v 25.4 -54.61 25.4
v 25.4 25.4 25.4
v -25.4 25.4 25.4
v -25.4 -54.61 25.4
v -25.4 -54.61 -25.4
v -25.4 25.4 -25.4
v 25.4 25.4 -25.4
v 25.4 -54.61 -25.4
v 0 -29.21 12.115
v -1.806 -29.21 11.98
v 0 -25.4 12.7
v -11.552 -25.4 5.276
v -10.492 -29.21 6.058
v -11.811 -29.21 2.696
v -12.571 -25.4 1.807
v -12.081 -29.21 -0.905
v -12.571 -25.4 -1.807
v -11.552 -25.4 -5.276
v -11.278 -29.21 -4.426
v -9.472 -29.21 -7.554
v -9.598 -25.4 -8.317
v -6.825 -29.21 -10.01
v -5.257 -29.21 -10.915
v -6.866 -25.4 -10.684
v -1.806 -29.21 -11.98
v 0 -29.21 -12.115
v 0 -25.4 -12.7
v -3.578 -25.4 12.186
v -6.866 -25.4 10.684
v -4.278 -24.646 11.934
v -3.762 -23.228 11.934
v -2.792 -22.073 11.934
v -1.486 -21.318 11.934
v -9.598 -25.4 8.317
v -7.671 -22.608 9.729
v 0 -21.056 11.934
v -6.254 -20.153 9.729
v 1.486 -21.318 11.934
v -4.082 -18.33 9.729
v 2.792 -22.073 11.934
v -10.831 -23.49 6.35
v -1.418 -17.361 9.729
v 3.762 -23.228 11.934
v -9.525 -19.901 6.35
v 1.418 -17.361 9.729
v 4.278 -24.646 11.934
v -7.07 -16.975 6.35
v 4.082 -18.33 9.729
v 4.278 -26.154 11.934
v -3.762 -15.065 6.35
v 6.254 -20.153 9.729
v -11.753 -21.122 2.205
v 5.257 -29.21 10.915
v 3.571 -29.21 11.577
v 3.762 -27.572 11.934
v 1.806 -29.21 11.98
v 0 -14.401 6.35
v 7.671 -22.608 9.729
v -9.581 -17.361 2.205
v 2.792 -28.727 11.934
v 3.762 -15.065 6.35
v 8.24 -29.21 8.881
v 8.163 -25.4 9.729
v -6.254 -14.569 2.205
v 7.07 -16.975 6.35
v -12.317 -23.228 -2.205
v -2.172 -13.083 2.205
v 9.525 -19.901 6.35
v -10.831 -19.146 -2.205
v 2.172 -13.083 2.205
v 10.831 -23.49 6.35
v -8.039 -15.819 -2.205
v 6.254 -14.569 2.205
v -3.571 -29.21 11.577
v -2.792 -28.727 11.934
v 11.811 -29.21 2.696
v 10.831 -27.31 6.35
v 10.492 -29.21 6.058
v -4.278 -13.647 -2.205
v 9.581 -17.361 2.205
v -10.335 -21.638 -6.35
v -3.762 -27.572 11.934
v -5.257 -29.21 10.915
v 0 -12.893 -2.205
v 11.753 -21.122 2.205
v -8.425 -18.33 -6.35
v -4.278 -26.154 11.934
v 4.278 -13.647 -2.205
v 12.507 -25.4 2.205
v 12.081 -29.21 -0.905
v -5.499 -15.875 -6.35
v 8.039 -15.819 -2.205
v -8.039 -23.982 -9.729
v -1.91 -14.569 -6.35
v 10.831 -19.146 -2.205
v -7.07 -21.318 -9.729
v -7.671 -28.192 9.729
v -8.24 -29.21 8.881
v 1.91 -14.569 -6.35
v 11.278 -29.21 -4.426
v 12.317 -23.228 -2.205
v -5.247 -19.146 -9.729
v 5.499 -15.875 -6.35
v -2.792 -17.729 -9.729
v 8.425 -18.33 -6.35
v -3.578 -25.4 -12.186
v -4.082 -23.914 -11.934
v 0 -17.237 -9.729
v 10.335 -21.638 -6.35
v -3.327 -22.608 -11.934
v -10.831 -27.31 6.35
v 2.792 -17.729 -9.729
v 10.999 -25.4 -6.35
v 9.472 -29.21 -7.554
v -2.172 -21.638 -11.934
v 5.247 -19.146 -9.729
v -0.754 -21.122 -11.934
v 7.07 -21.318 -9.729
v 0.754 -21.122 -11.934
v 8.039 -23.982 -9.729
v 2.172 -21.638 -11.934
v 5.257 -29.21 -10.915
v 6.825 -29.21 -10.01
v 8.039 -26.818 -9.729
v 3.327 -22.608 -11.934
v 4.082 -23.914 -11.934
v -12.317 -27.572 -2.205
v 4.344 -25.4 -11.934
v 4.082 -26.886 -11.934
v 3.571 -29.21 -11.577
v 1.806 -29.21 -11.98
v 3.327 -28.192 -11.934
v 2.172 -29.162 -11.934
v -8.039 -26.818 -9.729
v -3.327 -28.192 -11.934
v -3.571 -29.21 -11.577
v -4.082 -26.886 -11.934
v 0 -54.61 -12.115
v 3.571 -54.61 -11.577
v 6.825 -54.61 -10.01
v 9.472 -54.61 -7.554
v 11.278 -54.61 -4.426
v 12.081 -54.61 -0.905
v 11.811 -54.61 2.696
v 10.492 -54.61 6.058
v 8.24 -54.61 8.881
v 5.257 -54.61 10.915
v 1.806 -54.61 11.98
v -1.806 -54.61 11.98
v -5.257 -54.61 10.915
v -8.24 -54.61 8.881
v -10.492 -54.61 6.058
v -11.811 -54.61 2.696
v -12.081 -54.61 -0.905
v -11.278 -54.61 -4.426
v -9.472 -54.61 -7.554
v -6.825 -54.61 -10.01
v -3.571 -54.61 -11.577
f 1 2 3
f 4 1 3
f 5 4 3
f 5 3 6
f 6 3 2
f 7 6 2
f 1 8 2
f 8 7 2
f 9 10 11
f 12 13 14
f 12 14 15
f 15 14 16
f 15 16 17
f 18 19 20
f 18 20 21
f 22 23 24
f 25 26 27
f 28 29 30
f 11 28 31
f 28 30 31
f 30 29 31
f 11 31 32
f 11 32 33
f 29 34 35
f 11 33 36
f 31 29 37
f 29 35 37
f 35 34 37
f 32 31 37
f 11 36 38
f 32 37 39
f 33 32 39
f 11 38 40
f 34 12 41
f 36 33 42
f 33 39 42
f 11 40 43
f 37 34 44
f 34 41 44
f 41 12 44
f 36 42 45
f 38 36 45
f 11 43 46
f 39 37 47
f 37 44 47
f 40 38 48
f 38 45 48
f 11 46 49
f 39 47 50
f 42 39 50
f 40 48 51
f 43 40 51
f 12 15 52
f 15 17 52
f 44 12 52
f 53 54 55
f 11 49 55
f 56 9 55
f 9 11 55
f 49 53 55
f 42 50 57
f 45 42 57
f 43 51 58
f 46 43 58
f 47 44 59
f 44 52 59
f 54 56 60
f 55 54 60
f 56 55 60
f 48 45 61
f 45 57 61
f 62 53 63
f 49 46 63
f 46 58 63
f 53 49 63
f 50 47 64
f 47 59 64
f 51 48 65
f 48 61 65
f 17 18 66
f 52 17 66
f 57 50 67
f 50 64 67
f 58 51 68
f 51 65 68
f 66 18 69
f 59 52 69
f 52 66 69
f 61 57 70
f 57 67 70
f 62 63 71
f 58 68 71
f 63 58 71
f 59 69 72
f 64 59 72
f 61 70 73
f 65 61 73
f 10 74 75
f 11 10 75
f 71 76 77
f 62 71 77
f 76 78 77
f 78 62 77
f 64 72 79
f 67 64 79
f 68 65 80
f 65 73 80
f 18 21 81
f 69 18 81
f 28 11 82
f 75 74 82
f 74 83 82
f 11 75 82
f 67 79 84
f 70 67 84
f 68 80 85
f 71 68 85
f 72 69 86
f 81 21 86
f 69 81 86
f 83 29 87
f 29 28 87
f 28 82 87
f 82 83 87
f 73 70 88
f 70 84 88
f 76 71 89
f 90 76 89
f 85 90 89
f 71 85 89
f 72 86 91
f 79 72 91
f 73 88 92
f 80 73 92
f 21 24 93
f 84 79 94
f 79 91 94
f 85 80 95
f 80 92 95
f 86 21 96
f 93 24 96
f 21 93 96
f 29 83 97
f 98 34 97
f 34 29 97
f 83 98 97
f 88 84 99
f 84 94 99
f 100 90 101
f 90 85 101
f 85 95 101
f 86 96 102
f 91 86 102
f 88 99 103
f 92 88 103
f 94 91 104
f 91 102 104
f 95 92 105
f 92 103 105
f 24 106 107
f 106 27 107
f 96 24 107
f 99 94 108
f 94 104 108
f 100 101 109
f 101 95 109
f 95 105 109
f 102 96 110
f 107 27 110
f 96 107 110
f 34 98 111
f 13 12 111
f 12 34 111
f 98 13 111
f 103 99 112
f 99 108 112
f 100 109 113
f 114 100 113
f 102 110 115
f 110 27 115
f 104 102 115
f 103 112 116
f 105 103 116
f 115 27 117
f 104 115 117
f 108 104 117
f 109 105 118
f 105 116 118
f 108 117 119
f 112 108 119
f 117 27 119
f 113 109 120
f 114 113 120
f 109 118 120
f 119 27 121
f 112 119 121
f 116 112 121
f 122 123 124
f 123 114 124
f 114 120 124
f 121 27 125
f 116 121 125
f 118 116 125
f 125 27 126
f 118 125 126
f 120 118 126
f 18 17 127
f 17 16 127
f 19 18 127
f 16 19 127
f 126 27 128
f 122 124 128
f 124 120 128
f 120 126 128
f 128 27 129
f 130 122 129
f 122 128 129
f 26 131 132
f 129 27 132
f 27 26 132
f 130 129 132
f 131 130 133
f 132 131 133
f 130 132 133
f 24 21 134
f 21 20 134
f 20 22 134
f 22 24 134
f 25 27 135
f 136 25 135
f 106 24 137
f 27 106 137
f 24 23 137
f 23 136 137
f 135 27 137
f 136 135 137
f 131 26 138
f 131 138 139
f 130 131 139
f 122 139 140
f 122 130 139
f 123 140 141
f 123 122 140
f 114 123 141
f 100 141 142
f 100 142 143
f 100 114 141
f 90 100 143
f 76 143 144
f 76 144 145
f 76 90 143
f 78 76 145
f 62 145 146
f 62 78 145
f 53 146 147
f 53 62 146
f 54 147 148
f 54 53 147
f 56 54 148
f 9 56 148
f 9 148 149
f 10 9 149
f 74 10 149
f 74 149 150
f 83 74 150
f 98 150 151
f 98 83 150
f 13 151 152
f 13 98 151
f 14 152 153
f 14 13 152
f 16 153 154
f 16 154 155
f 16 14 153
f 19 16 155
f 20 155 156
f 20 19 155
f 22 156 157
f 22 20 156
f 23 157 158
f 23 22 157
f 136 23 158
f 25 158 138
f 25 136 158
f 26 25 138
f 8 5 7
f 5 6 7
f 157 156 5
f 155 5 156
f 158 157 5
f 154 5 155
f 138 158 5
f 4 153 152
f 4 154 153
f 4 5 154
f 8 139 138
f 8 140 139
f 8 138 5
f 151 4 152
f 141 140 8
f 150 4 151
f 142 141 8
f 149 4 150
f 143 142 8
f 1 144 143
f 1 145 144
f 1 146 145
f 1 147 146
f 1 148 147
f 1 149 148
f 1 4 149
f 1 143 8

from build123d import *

# Parameters (mm, degrees)
F0_W     = 25.4
F0_H     = 50.8
F1_DEPTH = 25.4
F3_DEPTH = 25.4
F5_DEPTH = 21.59
F6_DEPTH = 25.4


with BuildPart() as f1:
    # F0 (on Front) → F1 (new body, symmetric)
    with BuildSketch(Plane.XZ):
        with Locations((-12.7, 0)):
            Rectangle(F0_W, F0_H)
        with Locations((12.7, 0)):
            Rectangle(F0_W, F0_H)
    extrude(amount=F1_DEPTH, both=True)

    # F2 (on face) → F3 (join)
    with BuildSketch(Plane.XZ.offset(25.4)):
        with BuildLine():
            ThreePointArc((0, -12.7), (-12.7, 0), (0, 12.7))
            Line((0, 12.7), (0, 25.4))
            Line((0, 25.4), (-25.4, 25.4))
            Line((-25.4, 25.4), (-25.4, -25.4))
            Line((-25.4, -25.4), (0, -25.4))
            Line((0, -25.4), (0, -12.7))
        make_face()
        with BuildLine():
            ThreePointArc((0, 12.7), (8.9802561211, 8.9802561211), (12.7, 0))
            ThreePointArc((12.7, 0), (8.9802561211, -8.9802561211), (0, -12.7))
            Line((0, -12.7), (0, -25.4))
            Line((0, -25.4), (25.4, -25.4))
            Line((25.4, -25.4), (25.4, 25.4))
            Line((25.4, 25.4), (0, 25.4))
            Line((0, 25.4), (0, 12.7))
        make_face()
        with BuildLine():
            Line((0, -12.7), (0, 12.7))
            ThreePointArc((0, 12.7), (-12.7, 0), (0, -12.7))
        make_face()
        with BuildLine():
            ThreePointArc((0, -12.7), (8.9802561211, -8.9802561211), (12.7, 0))
            ThreePointArc((12.7, 0), (8.9802561211, 8.9802561211), (0, 12.7))
            Line((0, 12.7), (0, -12.7))
        make_face()
    extrude(amount=F3_DEPTH)

    # F2 (on face) → F4 (revolve, cut)
    with BuildSketch(Plane.XZ.offset(25.4)):
        with BuildLine():
            Line((0, -12.7), (0, 12.7))
            ThreePointArc((0, 12.7), (-12.7, 0), (0, -12.7))
        make_face()
    revolve(axis=Axis((0, -25.4, -7.401805371), (0, 0, -1)), mode=Mode.SUBTRACT)

    # F5 (cut): a face of the model
    f5_faces = [f1.faces().sort_by_distance(p)[0] for p in [
        (0, -50.8, 0),
    ]]
    extrude(f5_faces, amount=-F5_DEPTH, mode=Mode.SUBTRACT)

    # F6 (add): a face of the model
    f6_faces = [f1.faces().sort_by_distance(p)[0] for p in [
        (-24.6815795103, -29.21, 0),
    ]]
    extrude(f6_faces, amount=F6_DEPTH)


solid = f1.part
